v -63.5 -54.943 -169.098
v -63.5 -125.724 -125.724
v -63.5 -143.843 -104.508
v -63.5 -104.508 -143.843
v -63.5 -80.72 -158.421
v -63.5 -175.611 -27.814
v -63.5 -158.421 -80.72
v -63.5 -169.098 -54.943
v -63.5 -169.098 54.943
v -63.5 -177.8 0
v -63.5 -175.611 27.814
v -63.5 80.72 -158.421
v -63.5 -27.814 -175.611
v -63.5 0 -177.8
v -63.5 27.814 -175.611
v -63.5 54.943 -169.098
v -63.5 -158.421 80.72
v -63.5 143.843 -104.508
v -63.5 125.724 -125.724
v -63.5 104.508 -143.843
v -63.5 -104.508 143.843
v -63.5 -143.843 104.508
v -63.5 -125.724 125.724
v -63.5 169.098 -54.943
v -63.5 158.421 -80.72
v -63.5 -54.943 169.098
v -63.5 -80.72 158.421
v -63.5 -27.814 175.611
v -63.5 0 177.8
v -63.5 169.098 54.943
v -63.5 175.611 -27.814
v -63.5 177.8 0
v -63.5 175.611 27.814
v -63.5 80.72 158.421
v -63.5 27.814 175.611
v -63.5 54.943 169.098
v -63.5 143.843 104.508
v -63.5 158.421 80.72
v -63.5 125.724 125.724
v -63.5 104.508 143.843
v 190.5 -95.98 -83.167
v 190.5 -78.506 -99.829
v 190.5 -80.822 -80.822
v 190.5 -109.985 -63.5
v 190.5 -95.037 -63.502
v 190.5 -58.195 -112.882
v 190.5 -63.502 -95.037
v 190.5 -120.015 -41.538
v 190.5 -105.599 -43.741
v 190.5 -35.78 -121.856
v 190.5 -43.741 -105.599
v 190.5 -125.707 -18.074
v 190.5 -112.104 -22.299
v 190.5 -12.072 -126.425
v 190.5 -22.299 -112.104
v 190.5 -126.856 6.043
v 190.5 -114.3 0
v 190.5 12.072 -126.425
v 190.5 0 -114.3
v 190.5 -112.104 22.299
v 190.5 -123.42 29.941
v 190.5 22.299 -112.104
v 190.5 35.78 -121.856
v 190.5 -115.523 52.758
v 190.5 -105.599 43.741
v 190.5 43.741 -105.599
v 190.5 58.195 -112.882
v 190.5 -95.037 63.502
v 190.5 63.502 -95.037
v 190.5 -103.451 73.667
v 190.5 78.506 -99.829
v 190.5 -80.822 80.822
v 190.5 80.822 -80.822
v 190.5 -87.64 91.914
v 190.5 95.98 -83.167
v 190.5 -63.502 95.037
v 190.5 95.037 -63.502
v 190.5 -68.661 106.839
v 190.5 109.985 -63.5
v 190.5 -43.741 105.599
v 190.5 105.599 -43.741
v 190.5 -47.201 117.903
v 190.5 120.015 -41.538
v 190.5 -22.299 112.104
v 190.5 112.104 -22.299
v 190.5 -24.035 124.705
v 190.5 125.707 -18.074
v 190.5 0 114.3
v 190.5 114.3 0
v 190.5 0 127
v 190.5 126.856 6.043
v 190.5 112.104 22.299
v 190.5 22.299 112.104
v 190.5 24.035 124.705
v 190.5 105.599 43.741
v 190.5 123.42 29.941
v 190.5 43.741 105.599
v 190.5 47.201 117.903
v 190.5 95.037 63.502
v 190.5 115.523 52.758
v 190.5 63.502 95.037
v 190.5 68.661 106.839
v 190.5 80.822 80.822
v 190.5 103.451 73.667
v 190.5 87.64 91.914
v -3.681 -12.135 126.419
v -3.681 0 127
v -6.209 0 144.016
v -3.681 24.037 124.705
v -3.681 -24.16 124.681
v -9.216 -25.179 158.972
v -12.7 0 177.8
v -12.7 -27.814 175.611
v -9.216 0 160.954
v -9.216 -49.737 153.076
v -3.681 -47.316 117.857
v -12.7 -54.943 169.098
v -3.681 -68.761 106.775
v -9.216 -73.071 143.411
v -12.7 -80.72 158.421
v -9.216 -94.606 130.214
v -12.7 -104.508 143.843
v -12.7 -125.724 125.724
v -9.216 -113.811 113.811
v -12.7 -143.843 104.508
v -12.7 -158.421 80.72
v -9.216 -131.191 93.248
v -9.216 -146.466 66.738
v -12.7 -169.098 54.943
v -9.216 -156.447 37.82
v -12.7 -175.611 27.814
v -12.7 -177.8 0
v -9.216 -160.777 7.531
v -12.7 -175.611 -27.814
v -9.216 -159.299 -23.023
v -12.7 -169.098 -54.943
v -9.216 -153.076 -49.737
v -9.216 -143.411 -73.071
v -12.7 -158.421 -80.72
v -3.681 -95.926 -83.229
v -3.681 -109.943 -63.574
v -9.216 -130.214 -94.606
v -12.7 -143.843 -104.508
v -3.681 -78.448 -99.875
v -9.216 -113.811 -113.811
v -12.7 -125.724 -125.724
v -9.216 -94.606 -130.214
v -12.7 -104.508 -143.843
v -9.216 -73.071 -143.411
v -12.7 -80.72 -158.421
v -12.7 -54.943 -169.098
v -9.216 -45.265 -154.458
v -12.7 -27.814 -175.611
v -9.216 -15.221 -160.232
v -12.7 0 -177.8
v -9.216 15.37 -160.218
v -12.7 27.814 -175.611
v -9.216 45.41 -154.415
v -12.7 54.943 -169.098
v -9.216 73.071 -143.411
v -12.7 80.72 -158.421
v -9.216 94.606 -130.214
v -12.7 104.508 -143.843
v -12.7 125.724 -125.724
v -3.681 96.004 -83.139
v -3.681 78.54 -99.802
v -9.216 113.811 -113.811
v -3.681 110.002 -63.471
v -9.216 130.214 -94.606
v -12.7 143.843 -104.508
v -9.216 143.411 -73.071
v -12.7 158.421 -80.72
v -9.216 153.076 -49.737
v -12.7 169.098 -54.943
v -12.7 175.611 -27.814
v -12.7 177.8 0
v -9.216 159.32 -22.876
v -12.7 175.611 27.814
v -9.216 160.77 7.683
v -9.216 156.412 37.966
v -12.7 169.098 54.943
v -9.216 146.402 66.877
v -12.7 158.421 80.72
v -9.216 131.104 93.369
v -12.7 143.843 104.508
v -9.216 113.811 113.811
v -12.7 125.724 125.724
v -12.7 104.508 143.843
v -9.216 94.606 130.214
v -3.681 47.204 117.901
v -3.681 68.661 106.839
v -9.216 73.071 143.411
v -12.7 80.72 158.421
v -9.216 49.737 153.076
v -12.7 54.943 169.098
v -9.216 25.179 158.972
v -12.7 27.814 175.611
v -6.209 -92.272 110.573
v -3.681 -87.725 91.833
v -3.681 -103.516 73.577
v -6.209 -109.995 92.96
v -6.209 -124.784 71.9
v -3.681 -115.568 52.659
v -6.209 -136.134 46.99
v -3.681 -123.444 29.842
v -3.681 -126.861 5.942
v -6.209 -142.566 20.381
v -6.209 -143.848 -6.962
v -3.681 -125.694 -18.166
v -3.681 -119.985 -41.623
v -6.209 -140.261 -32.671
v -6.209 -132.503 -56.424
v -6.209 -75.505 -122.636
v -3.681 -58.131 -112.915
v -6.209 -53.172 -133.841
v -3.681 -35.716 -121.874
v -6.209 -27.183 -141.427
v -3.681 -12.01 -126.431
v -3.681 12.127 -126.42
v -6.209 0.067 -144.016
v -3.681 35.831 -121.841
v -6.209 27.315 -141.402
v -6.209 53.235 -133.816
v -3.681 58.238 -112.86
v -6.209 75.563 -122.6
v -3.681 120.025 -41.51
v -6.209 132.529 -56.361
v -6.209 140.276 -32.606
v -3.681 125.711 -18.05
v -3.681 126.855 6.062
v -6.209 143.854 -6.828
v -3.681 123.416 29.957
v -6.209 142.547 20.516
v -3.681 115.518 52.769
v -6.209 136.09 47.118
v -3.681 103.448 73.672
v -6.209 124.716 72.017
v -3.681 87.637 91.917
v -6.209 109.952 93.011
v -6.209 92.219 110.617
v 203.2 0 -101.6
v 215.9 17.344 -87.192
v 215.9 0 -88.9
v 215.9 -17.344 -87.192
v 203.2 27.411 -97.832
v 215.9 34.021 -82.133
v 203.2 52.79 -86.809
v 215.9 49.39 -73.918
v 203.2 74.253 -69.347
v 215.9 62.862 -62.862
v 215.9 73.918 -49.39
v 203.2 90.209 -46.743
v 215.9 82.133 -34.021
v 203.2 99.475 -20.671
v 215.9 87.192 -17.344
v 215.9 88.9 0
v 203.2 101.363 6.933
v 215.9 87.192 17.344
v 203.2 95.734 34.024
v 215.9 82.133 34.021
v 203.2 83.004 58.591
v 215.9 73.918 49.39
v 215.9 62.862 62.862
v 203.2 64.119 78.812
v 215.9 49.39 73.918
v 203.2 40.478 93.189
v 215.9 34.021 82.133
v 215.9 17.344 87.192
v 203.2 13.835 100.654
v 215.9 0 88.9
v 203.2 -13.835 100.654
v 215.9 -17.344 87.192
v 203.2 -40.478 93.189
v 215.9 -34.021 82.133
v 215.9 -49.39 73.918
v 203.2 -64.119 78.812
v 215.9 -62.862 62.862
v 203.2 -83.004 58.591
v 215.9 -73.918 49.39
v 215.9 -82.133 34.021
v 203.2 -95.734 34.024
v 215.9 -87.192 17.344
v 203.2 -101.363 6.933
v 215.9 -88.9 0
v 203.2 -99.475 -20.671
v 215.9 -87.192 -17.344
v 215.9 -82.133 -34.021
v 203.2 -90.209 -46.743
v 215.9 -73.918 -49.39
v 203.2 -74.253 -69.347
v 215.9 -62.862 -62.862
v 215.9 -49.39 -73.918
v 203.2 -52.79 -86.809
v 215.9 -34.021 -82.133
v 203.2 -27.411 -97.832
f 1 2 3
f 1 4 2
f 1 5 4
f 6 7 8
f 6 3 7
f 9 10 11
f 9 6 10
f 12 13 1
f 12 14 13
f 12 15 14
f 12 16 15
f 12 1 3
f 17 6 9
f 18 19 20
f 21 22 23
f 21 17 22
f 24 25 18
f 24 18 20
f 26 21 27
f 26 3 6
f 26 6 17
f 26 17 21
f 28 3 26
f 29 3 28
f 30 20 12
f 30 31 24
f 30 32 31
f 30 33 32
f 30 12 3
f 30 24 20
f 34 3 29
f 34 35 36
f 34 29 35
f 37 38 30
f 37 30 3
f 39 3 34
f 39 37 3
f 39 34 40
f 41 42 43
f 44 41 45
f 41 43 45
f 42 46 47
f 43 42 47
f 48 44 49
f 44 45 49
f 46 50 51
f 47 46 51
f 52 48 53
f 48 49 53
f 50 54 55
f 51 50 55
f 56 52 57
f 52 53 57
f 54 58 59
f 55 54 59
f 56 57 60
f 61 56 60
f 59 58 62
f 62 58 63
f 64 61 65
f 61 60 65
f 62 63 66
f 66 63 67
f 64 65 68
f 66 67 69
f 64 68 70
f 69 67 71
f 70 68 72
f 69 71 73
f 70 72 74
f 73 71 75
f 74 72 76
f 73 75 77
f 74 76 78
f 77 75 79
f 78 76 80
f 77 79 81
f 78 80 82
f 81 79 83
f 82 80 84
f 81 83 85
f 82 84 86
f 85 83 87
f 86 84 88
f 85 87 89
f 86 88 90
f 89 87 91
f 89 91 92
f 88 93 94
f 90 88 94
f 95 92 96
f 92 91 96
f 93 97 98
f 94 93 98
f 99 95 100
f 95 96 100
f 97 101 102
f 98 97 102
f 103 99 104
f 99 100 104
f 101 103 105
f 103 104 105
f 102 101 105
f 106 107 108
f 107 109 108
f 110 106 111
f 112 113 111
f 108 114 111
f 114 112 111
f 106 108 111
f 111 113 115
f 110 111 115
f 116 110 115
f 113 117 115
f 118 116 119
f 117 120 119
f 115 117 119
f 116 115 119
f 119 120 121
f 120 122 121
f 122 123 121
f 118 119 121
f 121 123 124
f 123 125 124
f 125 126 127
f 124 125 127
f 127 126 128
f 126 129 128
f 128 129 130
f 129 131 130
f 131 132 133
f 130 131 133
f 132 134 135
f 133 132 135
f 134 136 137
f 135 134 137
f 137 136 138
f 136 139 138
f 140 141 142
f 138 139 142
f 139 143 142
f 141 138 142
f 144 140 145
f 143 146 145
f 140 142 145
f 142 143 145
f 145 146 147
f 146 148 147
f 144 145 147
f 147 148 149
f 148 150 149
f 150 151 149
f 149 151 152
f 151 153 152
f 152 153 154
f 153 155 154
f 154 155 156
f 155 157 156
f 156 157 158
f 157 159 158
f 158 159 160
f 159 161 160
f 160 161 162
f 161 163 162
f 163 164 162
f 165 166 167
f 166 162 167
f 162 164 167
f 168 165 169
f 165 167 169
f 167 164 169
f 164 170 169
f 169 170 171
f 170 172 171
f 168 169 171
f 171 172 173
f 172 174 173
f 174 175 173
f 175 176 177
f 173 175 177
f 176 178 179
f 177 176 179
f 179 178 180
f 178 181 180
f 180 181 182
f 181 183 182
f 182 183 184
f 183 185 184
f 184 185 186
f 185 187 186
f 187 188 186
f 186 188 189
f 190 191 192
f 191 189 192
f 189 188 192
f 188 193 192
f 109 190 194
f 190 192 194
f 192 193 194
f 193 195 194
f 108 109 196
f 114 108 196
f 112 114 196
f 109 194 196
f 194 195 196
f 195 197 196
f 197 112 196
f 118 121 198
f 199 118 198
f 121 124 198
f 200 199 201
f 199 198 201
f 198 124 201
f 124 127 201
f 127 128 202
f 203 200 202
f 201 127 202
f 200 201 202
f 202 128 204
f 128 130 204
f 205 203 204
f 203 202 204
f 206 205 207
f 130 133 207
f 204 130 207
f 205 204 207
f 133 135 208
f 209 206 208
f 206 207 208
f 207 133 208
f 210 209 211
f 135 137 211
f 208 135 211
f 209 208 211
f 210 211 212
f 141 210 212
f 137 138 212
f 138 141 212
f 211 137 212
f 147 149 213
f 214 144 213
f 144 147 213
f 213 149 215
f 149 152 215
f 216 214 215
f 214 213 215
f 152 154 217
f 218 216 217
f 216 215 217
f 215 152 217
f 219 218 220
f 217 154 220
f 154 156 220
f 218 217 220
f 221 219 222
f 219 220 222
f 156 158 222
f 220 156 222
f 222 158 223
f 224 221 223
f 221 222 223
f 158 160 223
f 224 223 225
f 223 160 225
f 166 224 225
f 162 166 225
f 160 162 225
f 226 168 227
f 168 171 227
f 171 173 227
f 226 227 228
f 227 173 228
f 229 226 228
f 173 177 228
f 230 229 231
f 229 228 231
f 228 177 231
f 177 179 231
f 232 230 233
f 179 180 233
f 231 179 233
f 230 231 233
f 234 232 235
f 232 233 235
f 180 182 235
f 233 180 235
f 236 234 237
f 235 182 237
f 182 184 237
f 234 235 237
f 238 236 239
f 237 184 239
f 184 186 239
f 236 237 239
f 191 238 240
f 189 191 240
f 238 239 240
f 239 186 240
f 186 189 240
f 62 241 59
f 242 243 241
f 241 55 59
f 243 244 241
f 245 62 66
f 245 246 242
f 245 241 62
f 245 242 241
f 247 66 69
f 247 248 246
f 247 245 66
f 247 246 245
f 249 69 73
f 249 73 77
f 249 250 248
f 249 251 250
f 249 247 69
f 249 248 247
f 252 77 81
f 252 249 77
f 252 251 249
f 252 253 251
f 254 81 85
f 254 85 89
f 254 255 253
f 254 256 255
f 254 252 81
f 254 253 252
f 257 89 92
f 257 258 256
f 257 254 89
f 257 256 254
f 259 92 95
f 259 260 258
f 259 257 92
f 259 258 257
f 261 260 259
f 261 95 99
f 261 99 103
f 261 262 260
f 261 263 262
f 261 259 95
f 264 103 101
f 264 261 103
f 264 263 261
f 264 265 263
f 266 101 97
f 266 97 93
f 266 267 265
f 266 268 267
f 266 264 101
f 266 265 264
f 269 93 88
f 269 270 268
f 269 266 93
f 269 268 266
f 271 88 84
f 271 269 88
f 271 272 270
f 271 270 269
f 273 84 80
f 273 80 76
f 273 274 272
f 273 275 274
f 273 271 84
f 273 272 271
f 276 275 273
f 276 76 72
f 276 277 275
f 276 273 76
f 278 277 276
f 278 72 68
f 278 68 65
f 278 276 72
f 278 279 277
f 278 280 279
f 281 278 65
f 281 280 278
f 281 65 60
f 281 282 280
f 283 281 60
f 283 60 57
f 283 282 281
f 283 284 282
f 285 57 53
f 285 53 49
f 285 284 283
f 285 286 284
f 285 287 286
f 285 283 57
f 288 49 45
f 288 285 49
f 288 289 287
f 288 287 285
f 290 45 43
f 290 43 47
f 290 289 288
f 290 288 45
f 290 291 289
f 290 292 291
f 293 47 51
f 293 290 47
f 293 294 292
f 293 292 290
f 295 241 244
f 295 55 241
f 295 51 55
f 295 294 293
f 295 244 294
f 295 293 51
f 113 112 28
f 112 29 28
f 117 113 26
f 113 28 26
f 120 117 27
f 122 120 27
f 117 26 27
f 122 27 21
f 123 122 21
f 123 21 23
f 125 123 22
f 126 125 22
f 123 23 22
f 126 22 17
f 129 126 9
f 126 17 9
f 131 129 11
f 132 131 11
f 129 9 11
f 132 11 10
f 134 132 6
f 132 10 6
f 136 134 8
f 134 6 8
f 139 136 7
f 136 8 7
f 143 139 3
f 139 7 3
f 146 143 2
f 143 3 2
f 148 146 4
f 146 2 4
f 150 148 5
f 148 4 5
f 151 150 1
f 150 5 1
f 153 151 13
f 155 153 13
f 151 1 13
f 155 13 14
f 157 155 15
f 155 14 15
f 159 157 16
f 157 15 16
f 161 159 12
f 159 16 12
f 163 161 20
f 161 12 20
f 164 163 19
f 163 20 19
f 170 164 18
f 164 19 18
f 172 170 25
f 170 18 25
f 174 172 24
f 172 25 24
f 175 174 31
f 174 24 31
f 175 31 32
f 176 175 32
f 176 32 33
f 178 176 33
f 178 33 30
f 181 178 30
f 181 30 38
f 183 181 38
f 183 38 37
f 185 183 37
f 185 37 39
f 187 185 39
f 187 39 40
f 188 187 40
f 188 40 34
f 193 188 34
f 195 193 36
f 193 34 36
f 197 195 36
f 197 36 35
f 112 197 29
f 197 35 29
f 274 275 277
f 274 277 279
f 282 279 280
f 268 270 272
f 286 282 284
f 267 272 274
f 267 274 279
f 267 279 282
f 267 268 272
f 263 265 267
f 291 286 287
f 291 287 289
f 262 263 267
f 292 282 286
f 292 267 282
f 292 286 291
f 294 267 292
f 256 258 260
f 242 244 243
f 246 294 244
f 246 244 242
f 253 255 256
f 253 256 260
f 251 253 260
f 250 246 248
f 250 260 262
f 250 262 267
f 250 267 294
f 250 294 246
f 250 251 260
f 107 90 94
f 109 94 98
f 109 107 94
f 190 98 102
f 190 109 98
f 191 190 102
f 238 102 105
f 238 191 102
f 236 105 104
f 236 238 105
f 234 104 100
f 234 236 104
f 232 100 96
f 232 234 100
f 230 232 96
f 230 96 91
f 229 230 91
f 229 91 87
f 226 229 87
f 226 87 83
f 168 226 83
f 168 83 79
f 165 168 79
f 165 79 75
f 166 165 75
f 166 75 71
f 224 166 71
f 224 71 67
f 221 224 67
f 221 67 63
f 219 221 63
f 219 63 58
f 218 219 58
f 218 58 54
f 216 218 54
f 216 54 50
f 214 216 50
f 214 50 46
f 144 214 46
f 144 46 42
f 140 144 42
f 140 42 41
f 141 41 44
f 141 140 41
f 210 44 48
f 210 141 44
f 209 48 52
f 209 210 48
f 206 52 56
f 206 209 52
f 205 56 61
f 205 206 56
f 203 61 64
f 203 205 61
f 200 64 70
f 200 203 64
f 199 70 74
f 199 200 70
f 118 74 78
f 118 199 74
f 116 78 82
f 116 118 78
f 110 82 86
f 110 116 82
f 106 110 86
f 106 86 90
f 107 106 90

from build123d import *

# Parameters (mm, degrees)
SKETCH4_R           = 127
BOSS_EXTRUDE1_DEPTH = 254
SKETCH5_R           = 114.3
BOSS_EXTRUDE2_DEPTH = 25.4
CHAMFER1_SIZE       = 25.4


with BuildPart() as part:
    # Sketch3 → Revolve1 (revolve)
    with BuildSketch(Plane.XY, mode=Mode.PRIVATE) as revolve1_sk:
        with BuildLine():
            Line((-12.7, 177.8), (-63.5, 177.8))
            Line((-63.5, 177.8), (-63.5, 0))
            Line((-63.5, 0), (0, 0))
            ThreePointArc((0, 0), (0.183912717, 89.366708051), (-12.7, 177.8))
        make_face()
    revolve(revolve1_sk.sketch.rotate(Axis((-63.5, 0, 0), (1, 0, 0)), 90), axis=Axis((-63.5, 0, 0), (1, 0, 0)))

    # Sketch4 → Boss-Extrude1 (add)
    with BuildSketch(Plane.ZY.offset(63.5)):
        Circle(SKETCH4_R)
    extrude(amount=-BOSS_EXTRUDE1_DEPTH)

    # Sketch5 → Boss-Extrude2 (add)
    with BuildSketch(Plane(origin=(190.5, 0, 0), x_dir=(0, 0, -1), z_dir=(1, 0, 0))):
        Circle(SKETCH5_R)
    extrude(amount=BOSS_EXTRUDE2_DEPTH)

    # Chamfer1
    chamfer1_edges = [part.edges().sort_by_distance(p)[0] for p in [
        (215.9, 0, 114.3),
    ]]
    chamfer(chamfer1_edges, length=CHAMFER1_SIZE - 0.0001)  # a hair under: the kernel refuses the full size


solid = part.part
